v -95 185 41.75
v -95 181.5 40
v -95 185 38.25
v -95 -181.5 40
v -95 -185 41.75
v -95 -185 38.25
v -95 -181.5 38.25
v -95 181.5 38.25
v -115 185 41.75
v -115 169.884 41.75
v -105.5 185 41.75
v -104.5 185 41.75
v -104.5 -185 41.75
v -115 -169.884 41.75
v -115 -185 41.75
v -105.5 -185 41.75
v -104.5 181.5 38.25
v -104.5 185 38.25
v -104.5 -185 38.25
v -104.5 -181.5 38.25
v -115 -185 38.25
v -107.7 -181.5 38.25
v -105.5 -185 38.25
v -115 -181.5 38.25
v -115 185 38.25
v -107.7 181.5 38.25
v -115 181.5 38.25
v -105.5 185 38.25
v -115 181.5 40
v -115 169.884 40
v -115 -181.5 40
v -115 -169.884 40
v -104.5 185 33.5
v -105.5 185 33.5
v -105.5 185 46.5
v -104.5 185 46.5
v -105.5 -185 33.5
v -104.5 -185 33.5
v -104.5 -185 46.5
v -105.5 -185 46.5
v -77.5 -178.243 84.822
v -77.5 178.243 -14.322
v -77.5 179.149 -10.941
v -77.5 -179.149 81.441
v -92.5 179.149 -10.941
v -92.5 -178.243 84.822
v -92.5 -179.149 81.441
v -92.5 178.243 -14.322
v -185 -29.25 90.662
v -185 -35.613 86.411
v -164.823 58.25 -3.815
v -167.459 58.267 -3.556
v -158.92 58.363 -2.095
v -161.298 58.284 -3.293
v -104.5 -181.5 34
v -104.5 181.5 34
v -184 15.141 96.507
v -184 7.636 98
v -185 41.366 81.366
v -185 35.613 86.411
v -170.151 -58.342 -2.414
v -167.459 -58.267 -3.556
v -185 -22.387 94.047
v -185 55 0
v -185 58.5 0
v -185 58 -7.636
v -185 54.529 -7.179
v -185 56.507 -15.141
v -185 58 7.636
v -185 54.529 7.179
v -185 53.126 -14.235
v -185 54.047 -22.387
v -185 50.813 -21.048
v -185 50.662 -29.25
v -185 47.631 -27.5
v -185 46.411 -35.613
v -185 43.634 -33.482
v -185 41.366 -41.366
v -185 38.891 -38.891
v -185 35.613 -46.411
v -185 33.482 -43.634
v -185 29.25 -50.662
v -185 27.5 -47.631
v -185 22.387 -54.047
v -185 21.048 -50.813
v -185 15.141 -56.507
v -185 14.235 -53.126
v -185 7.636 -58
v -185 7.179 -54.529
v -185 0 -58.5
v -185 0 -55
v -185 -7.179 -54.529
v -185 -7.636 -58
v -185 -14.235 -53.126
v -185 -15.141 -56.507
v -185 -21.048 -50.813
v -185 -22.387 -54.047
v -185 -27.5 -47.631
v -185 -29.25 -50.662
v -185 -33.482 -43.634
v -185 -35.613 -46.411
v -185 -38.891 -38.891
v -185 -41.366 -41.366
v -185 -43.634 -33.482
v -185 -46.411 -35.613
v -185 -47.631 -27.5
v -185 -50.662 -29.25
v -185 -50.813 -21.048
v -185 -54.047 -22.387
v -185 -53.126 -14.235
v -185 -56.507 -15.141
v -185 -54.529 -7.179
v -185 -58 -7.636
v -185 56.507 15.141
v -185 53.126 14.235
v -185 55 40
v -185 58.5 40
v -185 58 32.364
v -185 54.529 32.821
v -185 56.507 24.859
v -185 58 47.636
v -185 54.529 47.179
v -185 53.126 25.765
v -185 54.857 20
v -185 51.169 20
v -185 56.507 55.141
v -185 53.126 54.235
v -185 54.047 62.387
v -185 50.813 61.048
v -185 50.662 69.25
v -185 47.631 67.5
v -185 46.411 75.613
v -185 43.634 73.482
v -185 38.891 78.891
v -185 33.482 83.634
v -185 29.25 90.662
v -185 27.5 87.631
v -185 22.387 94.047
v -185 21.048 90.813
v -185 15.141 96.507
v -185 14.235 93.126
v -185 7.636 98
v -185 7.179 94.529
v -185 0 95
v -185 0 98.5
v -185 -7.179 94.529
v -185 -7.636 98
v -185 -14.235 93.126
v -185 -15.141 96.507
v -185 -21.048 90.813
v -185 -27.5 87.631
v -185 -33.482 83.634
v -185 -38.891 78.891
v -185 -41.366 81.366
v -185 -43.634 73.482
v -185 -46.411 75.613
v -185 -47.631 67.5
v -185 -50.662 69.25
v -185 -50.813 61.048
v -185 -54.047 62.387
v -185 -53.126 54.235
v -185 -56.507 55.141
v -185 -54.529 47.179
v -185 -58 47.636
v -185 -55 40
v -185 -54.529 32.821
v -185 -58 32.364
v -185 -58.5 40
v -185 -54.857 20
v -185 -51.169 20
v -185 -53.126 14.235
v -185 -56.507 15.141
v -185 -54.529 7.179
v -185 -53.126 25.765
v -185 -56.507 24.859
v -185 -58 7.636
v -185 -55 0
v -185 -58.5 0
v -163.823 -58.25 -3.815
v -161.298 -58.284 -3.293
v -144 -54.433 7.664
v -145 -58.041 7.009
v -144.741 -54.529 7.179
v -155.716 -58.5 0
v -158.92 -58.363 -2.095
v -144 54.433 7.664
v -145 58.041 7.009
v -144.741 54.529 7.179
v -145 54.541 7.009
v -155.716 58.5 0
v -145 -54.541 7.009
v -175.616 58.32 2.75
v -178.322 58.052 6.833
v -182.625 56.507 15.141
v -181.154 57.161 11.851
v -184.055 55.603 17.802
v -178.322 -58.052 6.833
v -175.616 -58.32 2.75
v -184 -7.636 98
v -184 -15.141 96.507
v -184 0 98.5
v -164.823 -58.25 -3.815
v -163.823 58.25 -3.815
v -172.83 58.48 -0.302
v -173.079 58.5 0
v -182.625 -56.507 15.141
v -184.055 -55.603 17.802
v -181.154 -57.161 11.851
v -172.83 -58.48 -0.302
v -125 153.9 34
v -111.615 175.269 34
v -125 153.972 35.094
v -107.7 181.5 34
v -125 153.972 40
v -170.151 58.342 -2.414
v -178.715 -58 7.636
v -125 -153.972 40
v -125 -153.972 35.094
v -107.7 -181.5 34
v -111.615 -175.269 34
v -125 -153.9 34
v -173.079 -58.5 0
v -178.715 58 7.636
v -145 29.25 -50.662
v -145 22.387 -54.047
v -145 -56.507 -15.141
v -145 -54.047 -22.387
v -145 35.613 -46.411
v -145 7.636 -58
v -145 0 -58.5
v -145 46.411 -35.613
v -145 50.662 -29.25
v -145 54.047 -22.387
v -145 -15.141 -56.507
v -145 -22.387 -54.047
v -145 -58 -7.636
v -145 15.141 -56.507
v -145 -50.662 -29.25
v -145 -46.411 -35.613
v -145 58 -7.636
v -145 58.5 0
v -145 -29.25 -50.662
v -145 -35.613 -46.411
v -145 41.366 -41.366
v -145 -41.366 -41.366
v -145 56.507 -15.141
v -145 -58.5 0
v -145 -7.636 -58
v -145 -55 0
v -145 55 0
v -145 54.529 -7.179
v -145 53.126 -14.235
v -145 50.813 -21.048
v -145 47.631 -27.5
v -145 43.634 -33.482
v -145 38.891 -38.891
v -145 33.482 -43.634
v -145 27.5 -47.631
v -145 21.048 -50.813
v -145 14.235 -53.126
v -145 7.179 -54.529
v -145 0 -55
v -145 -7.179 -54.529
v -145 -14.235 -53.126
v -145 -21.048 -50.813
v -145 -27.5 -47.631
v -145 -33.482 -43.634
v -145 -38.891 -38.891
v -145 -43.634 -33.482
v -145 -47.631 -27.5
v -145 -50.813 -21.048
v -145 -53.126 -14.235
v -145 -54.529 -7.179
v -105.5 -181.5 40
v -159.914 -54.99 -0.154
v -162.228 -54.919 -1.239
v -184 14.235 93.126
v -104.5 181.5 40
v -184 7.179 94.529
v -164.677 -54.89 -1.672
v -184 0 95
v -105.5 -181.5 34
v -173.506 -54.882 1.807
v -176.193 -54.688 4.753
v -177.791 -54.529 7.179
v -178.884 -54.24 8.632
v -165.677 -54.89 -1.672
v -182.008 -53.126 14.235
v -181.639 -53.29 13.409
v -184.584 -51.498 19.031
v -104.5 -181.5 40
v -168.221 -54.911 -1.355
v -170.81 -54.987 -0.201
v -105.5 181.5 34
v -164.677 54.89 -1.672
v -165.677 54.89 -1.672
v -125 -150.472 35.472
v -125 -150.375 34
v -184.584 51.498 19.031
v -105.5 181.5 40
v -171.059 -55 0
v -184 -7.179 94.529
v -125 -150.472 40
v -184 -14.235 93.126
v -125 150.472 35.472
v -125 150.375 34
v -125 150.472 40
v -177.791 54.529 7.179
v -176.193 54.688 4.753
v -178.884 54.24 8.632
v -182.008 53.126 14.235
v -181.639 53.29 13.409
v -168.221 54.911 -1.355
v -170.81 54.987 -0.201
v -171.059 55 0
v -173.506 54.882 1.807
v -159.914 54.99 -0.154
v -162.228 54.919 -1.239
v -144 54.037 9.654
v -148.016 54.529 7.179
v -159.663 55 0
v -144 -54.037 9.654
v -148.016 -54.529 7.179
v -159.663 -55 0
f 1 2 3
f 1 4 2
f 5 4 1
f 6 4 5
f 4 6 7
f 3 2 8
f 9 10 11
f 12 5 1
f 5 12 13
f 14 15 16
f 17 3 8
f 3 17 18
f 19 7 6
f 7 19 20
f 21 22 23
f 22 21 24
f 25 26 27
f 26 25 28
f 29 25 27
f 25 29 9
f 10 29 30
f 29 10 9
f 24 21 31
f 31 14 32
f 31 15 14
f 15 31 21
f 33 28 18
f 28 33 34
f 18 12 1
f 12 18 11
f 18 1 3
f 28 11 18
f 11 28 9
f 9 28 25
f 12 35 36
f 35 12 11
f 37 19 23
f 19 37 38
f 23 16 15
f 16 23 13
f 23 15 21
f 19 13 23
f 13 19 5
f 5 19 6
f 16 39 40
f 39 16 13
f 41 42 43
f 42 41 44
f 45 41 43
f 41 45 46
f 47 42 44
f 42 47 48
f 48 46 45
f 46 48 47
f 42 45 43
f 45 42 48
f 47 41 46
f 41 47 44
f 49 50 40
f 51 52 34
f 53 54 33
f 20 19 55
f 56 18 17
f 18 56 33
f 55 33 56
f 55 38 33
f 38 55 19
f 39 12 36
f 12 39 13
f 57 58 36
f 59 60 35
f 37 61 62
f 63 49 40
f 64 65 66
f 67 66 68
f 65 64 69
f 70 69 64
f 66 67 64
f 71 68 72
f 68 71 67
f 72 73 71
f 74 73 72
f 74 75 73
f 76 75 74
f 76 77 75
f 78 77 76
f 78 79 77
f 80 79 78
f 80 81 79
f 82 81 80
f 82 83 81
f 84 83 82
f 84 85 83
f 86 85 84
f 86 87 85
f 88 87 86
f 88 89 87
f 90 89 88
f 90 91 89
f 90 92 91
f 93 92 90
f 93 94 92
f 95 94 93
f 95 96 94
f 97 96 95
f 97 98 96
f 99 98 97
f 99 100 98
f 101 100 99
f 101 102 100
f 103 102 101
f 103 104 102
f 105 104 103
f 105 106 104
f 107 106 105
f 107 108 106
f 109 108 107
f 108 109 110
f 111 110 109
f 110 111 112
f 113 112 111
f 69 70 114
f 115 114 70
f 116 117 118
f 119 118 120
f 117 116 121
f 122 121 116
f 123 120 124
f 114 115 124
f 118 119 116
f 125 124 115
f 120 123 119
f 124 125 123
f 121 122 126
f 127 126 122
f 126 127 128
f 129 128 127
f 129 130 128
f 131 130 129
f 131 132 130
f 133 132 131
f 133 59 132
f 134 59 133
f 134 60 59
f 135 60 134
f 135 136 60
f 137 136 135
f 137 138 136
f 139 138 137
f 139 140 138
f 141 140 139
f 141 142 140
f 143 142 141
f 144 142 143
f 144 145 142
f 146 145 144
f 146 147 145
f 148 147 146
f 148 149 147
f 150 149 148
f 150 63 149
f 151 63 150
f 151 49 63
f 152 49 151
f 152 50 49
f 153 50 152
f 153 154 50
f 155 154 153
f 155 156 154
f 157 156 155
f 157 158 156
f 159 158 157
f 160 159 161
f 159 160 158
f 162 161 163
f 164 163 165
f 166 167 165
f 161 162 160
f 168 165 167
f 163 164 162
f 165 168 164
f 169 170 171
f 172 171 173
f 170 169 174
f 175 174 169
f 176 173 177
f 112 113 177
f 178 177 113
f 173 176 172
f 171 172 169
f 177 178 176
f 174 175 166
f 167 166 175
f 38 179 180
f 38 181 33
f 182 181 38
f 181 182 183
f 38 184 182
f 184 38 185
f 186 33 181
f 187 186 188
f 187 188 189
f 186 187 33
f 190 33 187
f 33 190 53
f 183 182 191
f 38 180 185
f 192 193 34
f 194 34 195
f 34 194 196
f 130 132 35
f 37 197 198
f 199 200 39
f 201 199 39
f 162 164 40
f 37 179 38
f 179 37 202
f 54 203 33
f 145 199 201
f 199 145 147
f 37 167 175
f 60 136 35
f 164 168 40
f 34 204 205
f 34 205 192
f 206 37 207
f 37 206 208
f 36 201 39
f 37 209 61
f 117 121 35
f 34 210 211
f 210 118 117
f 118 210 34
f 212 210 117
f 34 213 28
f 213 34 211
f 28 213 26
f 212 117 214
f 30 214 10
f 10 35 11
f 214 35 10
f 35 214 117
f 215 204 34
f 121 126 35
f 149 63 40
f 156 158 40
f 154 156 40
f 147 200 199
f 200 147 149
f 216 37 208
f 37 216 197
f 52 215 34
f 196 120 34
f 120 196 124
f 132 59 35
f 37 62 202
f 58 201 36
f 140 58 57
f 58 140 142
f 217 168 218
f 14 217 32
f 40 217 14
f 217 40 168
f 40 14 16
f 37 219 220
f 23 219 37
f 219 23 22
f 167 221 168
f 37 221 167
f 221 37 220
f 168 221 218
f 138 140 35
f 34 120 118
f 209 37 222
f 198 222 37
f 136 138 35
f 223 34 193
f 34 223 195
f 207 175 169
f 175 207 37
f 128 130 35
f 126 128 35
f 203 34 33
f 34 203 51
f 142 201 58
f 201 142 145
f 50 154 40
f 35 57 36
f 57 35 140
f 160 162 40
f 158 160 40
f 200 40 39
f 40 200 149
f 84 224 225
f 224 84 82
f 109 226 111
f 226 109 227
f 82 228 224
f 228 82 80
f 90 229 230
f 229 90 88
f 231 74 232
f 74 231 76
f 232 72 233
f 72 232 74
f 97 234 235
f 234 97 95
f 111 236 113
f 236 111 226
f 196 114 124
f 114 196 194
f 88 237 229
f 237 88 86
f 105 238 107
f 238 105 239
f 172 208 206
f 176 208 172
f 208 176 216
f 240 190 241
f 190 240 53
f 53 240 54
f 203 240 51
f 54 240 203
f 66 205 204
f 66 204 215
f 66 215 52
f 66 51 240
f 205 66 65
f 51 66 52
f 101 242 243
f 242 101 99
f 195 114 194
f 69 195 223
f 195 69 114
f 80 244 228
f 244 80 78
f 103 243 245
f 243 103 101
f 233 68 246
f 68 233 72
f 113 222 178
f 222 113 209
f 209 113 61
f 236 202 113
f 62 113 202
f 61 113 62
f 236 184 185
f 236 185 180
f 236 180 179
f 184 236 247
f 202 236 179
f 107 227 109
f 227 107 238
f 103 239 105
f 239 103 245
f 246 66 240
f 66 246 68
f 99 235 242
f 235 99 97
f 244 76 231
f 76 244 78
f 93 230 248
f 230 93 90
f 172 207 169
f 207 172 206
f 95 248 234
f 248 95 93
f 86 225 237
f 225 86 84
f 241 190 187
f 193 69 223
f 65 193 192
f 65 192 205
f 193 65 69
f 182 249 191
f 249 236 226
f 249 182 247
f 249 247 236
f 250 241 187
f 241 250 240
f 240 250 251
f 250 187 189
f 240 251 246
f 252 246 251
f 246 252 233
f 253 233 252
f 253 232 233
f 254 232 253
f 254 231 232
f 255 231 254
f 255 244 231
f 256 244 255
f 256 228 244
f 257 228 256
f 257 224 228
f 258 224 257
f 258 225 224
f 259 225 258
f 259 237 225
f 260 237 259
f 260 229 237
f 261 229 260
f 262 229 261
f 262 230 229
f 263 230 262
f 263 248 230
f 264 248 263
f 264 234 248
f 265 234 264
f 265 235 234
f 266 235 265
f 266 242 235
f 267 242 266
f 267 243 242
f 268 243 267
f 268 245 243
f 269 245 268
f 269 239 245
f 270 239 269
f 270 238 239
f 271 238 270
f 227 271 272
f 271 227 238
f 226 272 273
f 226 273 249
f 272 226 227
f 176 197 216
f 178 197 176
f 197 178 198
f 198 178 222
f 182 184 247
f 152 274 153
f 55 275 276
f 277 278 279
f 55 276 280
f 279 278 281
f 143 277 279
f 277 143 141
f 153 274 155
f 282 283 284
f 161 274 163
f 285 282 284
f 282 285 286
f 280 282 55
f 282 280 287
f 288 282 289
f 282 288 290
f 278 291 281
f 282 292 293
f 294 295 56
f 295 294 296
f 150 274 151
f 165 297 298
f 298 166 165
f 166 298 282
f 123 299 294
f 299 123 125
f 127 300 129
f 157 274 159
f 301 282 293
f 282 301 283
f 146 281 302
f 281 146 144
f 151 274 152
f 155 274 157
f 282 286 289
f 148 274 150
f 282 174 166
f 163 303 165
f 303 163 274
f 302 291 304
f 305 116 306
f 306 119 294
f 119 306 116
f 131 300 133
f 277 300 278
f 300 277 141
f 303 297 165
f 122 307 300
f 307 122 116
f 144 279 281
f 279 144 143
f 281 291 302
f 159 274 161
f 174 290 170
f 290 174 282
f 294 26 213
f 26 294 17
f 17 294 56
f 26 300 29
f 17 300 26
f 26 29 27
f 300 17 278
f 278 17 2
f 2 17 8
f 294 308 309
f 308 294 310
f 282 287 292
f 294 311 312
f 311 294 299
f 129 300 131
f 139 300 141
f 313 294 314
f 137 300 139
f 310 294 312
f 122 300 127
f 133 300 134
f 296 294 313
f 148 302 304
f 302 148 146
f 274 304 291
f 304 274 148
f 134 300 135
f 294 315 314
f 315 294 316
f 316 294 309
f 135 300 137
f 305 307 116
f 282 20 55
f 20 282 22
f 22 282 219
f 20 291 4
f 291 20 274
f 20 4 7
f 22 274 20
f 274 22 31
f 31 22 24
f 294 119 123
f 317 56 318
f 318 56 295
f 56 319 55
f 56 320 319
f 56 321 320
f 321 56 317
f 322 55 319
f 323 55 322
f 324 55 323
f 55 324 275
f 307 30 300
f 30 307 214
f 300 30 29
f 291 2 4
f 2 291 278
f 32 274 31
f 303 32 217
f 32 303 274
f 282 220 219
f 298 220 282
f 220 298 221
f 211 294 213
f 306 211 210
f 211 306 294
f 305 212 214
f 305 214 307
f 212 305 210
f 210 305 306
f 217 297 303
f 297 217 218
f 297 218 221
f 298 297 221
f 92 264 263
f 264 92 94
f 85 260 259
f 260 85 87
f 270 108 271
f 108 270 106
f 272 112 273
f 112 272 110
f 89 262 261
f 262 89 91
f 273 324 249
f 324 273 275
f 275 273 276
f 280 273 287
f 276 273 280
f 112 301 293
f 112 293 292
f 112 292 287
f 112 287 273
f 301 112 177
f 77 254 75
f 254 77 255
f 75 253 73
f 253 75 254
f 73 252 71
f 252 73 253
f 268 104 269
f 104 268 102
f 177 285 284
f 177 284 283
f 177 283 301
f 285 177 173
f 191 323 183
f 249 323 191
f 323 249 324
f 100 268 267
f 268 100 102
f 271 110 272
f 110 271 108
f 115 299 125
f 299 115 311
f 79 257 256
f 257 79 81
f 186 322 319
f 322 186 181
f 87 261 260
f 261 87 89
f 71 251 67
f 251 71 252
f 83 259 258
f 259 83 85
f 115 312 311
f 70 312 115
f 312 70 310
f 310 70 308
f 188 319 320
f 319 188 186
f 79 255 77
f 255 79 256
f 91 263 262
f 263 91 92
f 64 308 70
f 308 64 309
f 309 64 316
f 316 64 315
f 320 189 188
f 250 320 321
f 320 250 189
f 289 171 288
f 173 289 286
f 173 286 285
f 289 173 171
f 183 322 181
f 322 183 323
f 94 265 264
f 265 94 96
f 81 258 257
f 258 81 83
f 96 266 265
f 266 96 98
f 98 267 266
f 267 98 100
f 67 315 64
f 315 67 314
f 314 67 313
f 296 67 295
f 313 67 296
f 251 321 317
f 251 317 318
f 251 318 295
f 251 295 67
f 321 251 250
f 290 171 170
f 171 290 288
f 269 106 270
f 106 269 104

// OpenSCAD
// Waterfall Fan Spreader — single piece, 300mm wide, fits Qidi Max4
// Converts 110mm pipe flow into a wide thin sheet
//
// Print: PA12-CF, 0.2mm layer, 280°C, no supports needed (print flat)

/* [Pipe Connection] */
INLET_DIA = 110;        // mm — matches venturi outlet
COUPLING_DEPTH = 40;    // mm
WALL = 3.5;             // mm

/* [Spreader Geometry] */
SPREAD_WIDTH = 370;     // mm — max single-piece on Qidi Max4 (392mm X limit)
GAP = 6;                // mm — slot opening (6mm = visible sheet + good aeration)
LIP_ANGLE = 15;         // degrees — downward angle to prevent wind blow-back
TRANSITION_LENGTH = 80; // mm — round-to-slot transition length

/* [Cosmetic] */
NOTCH_SPACING = 20;     // mm — V-notches along the lip for visual effect
NOTCH_DEPTH = 3;        // mm

$fn = 48;

INNER_R = INLET_DIA / 2;
OUTER_R = INNER_R + WALL;

// Round inlet → rectangular slot transition
module spreader() {
    difference() {
        union() {
            // Inlet tube
            translate([-SPREAD_WIDTH/2, 0, 0]) {
                rotate([0, 90, 0]) {
                    cylinder(h=COUPLING_DEPTH, r=OUTER_R);
                }
            }
            
            // Transition box: round at inlet → slot at outlet
            translate([-SPREAD_WIDTH/2, 0, COUPLING_DEPTH]) {
                // Main transition body
                hull() {
                    // Inlet: round shape
                    translate([0, 0, 0]) {
                        rotate([0, 90, 0]) {
                            cylinder(h=1, r=OUTER_R);
                        }
                    }
                    // Outlet: rectangular slot
                    translate([TRANSITION_LENGTH, 0, 0]) {
                        cube([1, SPREAD_WIDTH, GAP + WALL*2], center=true);
                    }
                }
                
                // Extended spreader lip
                translate([TRANSITION_LENGTH, 0, 0]) {
                    // Upper lip
                    cube([20, SPREAD_WIDTH, WALL], center=true);
                    // Lower lip (angled down)
                    translate([20, 0, -GAP/2 - WALL/2]) {
                        rotate([-LIP_ANGLE, 0, 0]) {
                            cube([15, SPREAD_WIDTH, WALL], center=true);
                        }
                    }
                }
            }
        }
        
        // Hollow interior
        // Inlet tube hollow
        translate([-SPREAD_WIDTH/2, 0, 0]) {
            rotate([0, 90, 0]) {
                cylinder(h=COUPLING_DEPTH + 1, r=INNER_R);
            }
        }
        
        // Transition interior
        translate([-SPREAD_WIDTH/2, 0, COUPLING_DEPTH]) {
            hull() {
                translate([0, 0, 0]) {
                    rotate([0, 90, 0]) {
                        cylinder(h=1, r=INNER_R);
                    }
                }
                translate([TRANSITION_LENGTH, 0, 0]) {
                    translate([0, 0, -GAP/2]) {
                        cube([1, SPREAD_WIDTH - WALL*2, GAP], center=true);
                    }
                }
            }
            
            // Slot opening
            translate([TRANSITION_LENGTH, 0, 0]) {
                translate([-5, 0, -GAP/2]) {
                    cube([30, SPREAD_WIDTH - WALL*2, GAP], center=true);
                }
            }
        }
        
        // V-notches on the lip
        for (x = [-SPREAD_WIDTH/2 + NOTCH_SPACING: NOTCH_SPACING: SPREAD_WIDTH/2 - NOTCH_SPACING]) {
            translate([-SPREAD_WIDTH/2 + COUPLING_DEPTH + TRANSITION_LENGTH + 25, x, -GAP/2 - WALL - 1]) {
                rotate([90, 0, 0]) {
                    cylinder(h=WALL*3, r1=0, r2=NOTCH_DEPTH, $fn=3);
                }
            }
        }
    }
}

// Flange for bolting to venturi
module flange() {
    translate([-SPREAD_WIDTH/2, 0, 0]) {
        rotate([0, 90, 0]) {
            difference() {
                cylinder(h=5, r=OUTER_R + 10);
                cylinder(h=6, r=OUTER_R);
                // Bolt holes — 4× M6 on 130mm circle
                for (a = [0:90:270]) {
                    rotate([0, 0, a]) {
                        translate([0, 90, -1]) {
                            cylinder(h=7, r=3.5);
                        }
                    }
                }
            }
        }
    }
}

// Assemble
spreader();
// Optional flange if bolting instead of gluing
// translate([0, 0, -5]) flange();
